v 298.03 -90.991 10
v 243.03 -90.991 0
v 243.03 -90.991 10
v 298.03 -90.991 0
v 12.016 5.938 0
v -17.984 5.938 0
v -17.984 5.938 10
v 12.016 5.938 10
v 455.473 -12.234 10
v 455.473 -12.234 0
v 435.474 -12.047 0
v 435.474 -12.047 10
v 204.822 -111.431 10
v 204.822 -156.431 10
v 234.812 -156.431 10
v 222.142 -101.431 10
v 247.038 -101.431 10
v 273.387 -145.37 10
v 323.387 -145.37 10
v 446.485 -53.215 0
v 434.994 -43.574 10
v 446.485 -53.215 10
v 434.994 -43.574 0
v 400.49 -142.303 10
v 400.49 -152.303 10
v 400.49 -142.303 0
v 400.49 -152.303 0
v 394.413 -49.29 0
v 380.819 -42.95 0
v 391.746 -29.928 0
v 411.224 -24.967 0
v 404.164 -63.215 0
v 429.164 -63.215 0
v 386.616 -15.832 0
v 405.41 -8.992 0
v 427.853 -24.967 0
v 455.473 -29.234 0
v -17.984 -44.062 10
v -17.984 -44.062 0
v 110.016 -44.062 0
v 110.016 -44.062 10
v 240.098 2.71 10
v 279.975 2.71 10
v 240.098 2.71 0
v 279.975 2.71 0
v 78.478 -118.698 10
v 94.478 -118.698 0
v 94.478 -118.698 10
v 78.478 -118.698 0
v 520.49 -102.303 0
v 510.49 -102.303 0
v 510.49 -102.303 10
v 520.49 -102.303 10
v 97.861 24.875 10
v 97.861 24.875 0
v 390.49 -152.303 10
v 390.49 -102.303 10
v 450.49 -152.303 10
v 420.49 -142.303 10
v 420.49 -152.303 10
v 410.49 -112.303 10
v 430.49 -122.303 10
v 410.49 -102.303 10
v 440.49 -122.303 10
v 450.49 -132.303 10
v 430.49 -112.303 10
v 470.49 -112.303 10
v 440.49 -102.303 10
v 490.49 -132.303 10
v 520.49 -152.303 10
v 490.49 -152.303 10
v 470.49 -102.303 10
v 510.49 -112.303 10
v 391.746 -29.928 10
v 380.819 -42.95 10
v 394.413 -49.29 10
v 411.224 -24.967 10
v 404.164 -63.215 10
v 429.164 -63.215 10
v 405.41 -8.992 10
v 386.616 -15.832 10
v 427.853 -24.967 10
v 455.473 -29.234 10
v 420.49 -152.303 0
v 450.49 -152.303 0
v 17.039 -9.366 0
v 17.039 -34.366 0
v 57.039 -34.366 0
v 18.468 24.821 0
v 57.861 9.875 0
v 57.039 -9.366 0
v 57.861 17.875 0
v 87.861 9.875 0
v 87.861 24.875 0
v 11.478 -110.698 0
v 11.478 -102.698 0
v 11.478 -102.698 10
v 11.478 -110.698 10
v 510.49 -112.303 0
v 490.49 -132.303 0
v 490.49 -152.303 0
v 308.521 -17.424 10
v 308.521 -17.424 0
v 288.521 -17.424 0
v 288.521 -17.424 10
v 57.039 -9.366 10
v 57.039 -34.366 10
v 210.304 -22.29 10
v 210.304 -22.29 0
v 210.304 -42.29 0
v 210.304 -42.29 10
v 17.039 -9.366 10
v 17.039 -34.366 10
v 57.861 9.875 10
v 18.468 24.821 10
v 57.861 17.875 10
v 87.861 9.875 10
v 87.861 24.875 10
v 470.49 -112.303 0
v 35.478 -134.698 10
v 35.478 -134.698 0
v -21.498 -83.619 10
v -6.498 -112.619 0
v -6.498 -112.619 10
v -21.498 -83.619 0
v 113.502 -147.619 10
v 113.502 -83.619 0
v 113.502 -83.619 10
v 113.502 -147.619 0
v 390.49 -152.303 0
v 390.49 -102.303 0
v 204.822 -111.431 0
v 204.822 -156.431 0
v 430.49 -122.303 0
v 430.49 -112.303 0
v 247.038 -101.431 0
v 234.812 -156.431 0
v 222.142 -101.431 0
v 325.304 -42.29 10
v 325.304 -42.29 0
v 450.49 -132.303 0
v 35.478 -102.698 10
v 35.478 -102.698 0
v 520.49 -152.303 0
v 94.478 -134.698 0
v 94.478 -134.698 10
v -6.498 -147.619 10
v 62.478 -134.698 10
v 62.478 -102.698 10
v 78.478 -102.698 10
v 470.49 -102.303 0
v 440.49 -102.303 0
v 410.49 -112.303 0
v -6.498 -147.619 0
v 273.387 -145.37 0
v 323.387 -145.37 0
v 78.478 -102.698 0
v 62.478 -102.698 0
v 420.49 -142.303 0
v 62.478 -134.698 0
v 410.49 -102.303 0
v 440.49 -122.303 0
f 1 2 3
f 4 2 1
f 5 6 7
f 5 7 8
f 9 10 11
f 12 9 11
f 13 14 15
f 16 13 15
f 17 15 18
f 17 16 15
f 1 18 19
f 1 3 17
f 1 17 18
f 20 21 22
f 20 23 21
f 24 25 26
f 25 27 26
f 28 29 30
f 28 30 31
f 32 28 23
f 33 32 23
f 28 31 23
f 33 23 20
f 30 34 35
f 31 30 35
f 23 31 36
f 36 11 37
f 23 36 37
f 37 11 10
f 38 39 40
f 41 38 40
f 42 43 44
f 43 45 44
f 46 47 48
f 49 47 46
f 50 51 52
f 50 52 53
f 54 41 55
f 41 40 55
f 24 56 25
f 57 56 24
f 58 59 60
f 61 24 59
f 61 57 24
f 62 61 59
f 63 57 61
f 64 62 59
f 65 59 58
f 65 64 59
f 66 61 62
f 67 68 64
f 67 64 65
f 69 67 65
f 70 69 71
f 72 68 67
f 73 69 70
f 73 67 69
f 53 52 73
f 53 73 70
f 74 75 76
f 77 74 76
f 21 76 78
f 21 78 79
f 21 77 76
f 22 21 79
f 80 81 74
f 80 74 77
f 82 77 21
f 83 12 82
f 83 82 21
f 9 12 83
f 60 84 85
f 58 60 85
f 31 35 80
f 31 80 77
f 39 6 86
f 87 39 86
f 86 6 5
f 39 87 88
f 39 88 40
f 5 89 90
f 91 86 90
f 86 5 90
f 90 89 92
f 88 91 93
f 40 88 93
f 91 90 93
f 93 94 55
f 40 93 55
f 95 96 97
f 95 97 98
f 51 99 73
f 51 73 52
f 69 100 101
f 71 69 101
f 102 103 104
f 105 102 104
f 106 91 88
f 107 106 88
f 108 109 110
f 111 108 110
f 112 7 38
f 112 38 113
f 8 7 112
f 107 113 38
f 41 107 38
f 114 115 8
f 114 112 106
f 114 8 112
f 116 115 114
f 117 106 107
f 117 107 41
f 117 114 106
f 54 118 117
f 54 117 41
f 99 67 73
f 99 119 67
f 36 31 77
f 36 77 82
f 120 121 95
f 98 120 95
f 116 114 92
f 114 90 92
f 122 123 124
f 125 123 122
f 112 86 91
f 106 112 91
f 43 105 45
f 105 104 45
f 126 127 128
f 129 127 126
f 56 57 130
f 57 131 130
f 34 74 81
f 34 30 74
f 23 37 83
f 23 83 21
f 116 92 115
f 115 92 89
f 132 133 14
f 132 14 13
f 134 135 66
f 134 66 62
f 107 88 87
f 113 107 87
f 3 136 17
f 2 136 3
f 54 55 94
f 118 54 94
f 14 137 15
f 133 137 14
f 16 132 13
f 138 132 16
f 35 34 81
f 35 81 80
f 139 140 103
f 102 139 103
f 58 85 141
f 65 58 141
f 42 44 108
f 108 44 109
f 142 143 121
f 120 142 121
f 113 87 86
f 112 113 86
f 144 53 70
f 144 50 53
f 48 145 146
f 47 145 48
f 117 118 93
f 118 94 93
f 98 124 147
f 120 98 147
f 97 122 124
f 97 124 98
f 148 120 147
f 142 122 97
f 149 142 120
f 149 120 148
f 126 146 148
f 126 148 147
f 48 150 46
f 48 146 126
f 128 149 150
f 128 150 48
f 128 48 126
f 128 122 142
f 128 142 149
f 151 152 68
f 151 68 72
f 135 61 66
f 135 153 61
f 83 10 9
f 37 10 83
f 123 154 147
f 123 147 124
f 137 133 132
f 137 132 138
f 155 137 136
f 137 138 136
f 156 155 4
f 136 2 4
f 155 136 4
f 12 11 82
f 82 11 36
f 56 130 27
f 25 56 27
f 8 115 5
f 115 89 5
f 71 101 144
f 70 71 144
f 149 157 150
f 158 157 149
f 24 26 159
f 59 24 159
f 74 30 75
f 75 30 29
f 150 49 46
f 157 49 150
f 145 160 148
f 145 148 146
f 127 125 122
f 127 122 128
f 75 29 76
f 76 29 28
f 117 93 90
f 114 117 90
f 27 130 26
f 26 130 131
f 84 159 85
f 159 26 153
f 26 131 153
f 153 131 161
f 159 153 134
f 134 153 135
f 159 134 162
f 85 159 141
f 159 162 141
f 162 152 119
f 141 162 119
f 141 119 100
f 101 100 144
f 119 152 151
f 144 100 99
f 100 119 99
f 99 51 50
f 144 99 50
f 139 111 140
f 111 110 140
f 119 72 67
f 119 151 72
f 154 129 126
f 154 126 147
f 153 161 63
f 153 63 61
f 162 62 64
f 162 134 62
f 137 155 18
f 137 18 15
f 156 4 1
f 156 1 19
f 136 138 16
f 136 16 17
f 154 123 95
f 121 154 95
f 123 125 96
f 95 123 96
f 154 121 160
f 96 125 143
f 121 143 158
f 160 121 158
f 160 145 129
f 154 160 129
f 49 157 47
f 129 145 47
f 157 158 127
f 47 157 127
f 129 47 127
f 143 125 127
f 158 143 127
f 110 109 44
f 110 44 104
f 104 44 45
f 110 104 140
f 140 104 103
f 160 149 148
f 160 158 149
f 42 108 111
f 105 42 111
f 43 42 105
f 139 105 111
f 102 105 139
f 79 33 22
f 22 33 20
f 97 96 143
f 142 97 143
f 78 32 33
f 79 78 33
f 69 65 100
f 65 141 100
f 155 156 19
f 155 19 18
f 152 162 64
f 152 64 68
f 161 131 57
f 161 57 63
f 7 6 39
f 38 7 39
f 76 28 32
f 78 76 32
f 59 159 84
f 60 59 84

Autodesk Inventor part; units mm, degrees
ref_plane "YZ Plane" through (0, 0, 0) normal (1, 0, 0) x (0, 1, 0)
ref_plane "XZ Plane" through (0, 0, 0) normal (0, 1, 0) x (-1, 0, 0)
ref_plane "XY Plane" through (0, 0, 0) normal (0, 0, 1) x (1, 0, 0)
sketch "스케치1" plane through (0, 0, 0) normal (0, 0, 1) x (1, 0, 0)
  line L0 (-17.9838, 5.9383) -> (12.0162, 5.9383)
  line L1 (-17.9838, 5.9383) -> (-17.9838, -44.0617)
  line L2 (-17.9838, -44.0617) -> (110.0162, -44.0617)
  line L3 (110.0162, -44.0617) -> (97.8609, 24.8748)
  line L4 (97.8609, 24.8748) -> (87.8609, 24.8748)
  line L5 (87.8609, 24.8748) -> (87.8609, 9.8748)
  line L6 (87.8609, 9.8748) -> (57.8609, 9.8748)
  line L7 (57.8609, 9.8748) -> (57.8609, 17.8748)
  line L8 (57.8609, 17.8748) -> (18.4685, 24.8207)
  line L9 (18.4685, 24.8207) -> (12.0162, 5.9383)
  line L10 (17.0386, -9.366) -> (57.0386, -9.366)
  line L11 (57.0386, -9.366) -> (57.0386, -34.366)
  line L12 (57.0386, -34.366) -> (17.0386, -34.366)
  line L13 (17.0386, -34.366) -> (17.0386, -9.366)
  line L14 (-21.4983, -83.6189) -> (113.5017, -83.6189)
  line L15 (113.5017, -83.6189) -> (113.5017, -147.6189)
  line L16 (113.5017, -147.6189) -> (-6.4983, -147.6189)
  line L17 (-6.4983, -147.6189) -> (-6.4983, -112.6189)
  line L18 (-6.4983, -112.6189) -> (-21.4983, -83.6189)
  line L19 (11.4782, -102.6977) -> (11.4782, -110.6977)
  line L20 (11.4782, -102.6977) -> (35.4782, -102.6977)
  line L21 (35.4782, -102.6977) -> (35.4782, -134.6977)
  line L22 (35.4782, -134.6977) -> (11.4782, -110.6977)
  line L23 (62.4782, -102.6977) -> (62.4782, -134.6977)
  line L24 (62.4782, -134.6977) -> (94.4782, -134.6977)
  line L25 (94.4782, -134.6977) -> (94.4782, -118.6977)
  line L26 (94.4782, -118.6977) -> (78.4782, -118.6977)
  line L27 (78.4782, -118.6977) -> (78.4782, -102.6977)
  line L28 (78.4782, -102.6977) -> (62.4782, -102.6977)
  line L29 (210.3042, -22.2898) -> (210.3042, -42.2898)
  line L30 (210.3042, -42.2898) -> (325.3042, -42.2898)
  line L31 (325.3042, -42.2898) -> (308.521, -17.4237)
  line L32 (308.521, -17.4237) -> (288.521, -17.4237)
  line L33 (288.521, -17.4237) -> (279.9747, 2.7102)
  line L34 (279.9747, 2.7102) -> (240.098, 2.7102)
  line L35 (240.098, 2.7102) -> (210.3042, -22.2898)
  line L36 (243.03, -90.9913) -> (298.03, -90.9913)
  line L37 (298.03, -90.9913) -> (323.3871, -145.3698)
  line L38 (323.3871, -145.3698) -> (273.3871, -145.3698)
  line L39 (273.3871, -145.3698) -> (234.8117, -156.4311)
  line L40 (234.8117, -156.4311) -> (204.822, -156.4311)
  line L41 (204.822, -156.4311) -> (204.822, -111.4311)
  line L42 (204.822, -111.4311) -> (222.1425, -101.4311)
  line L43 (222.1425, -101.4311) -> (247.0375, -101.4311)
  line L44 (247.0375, -101.4311) -> (243.03, -90.9913)
  line L45 (391.7462, -29.9278) -> (380.8188, -42.9505)
  line L46 (380.8188, -42.9505) -> (394.4134, -49.2898)
  line L47 (394.4134, -49.2898) -> (404.1642, -63.2154)
  line L48 (404.1642, -63.2154) -> (429.1642, -63.2154)
  line L49 (429.1642, -63.2154) -> (446.4847, -53.2154)
  line L50 (391.7462, -29.9278) -> (386.6159, -15.8324)
  line L51 (391.7462, -29.9278) -> (406.7462, -29.9278) construction
  line L52 (386.6159, -15.8324) -> (405.4097, -8.992)
  line L53 (405.4097, -8.992) -> (411.2241, -24.9667)
  line L54 (455.4729, -12.2341) -> (435.4737, -12.0471)
  line L55 (435.4737, -12.0471) -> (427.8526, -24.9667)
  line L56 (411.2241, -24.9667) -> (427.8526, -24.9667)
  line L57 (455.4729, -12.2341) -> (455.4729, -29.2341)
  line L58 (455.4729, -29.2341) -> (434.9941, -43.5735)
  line L59 (434.9941, -43.5735) -> (446.4847, -53.2154)
  line L60 (390.4902, -102.3026) -> (410.4902, -102.3026)
  line L61 (410.4902, -102.3026) -> (410.4902, -112.3026)
  line L62 (410.4902, -112.3026) -> (430.4902, -112.3026)
  line L63 (430.4902, -112.3026) -> (430.4902, -122.3026)
  line L64 (430.4902, -122.3026) -> (440.4902, -122.3026)
  line L65 (440.4902, -122.3026) -> (440.4902, -102.3026)
  line L66 (440.4902, -102.3026) -> (470.4902, -102.3026)
  line L67 (470.4902, -102.3026) -> (470.4902, -112.3026)
  line L68 (470.4902, -112.3026) -> (510.4902, -112.3026)
  line L69 (510.4902, -112.3026) -> (510.4902, -102.3026)
  line L70 (510.4902, -102.3026) -> (520.4902, -102.3026)
  line L71 (520.4902, -102.3026) -> (520.4902, -152.3026)
  line L72 (390.4902, -102.3026) -> (390.4902, -152.3026)
  line L73 (390.4902, -152.3026) -> (400.4902, -152.3026)
  line L74 (400.4902, -152.3026) -> (400.4902, -142.3026)
  line L75 (400.4902, -142.3026) -> (420.4902, -142.3026)
  line L76 (420.4902, -142.3026) -> (420.4902, -152.3026)
  line L77 (420.4902, -152.3026) -> (450.4902, -152.3026)
  line L78 (450.4902, -152.3026) -> (450.4902, -132.3026)
  line L79 (450.4902, -132.3026) -> (490.4902, -132.3026)
  line L80 (490.4902, -132.3026) -> (490.4902, -152.3026)
  line L81 (490.4902, -152.3026) -> (520.4902, -152.3026)
  point P0 (0, 0)
  dimension "d0" = 30
  dimension "d1" = 50
  dimension "d2" = 128
  dimension "d3" = 70
  dimension "d4" = 80
  dimension "d5" = 10
  dimension "d6" = 15
  dimension "d7" = 30
  dimension "d8" = 8
  dimension "d9" = 40
  dimension "d10" = 100
  dimension "d11" = 40
  dimension "d12" = 25
  dimension "d13" = 135
  dimension "d14" = 64
  dimension "d15" = 120
  dimension "d16" = 35
  dimension "d17" = 8
  dimension "d18" = 24
  dimension "d19" = 32
  dimension "d20" = 32
  dimension "d21" = 16
  dimension "d22" = 16
  dimension "d23" = 27
  dimension "d28" = 20
  dimension "d29" = 115
  dimension "d30" = 30
  dimension "d31" = 20
  dimension "d32" = 67
  dimension "d33" = 50
  dimension "d34" = 45
  dimension "d35" = 55
  dimension "d36" = 60
  dimension "d37" = 50
  dimension "d38" = 65
  dimension "d39" = 40.13
  dimension "d40" = 16
  dimension "d41" = 45
  dimension "d42" = 20
  dimension "d43" = 120
  dimension "d44" = 69
  dimension "d56" = 17
  dimension "d58" = 15
  dimension "d59" = 75
  dimension "d60" = 17
  dimension "d61" = 150
  dimension "d62" = 25
  dimension "d63" = 20
  dimension "d64" = 150
  dimension "d77" = 125
  dimension "d78" = 15
  dimension "d80" = 20
  dimension "d81" = 17
  dimension "d82" = 20
  dimension "d83" = 15
  dimension "d84" = 120
  dimension "d85" = 120
  dimension "d87" = 90
  dimension "d88" = 90
  dimension "d97" = 17
  dimension "d98" = 25
  dimension "d99" = 55
  dimension "d100" = 75
  dimension "d103" = 20
extrude "돌출1" add sketch "스케치1" along normal blind 10 contours L0 L9 L8 L7 L6 L5 L4 L3 L2 L1
extrude "돌출2" add sketch "스케치1" along normal blind 10 contours L14 L15 L16 L17 L18
extrude "돌출3" add sketch "스케치1" along normal blind 10 contours L35 L34 L33 L32 L31 L30 L29
extrude "돌출4" add sketch "스케치1" along normal blind 10 contours L36 L37 L38 L39 L40 L41 L42 L43 L44
extrude "돌출5" add sketch "스케치1" along normal blind 10 contours L50 L52 L53 L56 L55 L54 L57 L58 L59 L49 L48 L47 L46 L45
extrude "돌출6" add sketch "스케치1" along normal blind 10 contours L60 L61 L62 L63 L64 L65 L66 L67 L68 L69 L70 L71 L81 L80 L79 L78 L77 L76 L75 L74 L73 L72
properties part number "240329_직선연습"
